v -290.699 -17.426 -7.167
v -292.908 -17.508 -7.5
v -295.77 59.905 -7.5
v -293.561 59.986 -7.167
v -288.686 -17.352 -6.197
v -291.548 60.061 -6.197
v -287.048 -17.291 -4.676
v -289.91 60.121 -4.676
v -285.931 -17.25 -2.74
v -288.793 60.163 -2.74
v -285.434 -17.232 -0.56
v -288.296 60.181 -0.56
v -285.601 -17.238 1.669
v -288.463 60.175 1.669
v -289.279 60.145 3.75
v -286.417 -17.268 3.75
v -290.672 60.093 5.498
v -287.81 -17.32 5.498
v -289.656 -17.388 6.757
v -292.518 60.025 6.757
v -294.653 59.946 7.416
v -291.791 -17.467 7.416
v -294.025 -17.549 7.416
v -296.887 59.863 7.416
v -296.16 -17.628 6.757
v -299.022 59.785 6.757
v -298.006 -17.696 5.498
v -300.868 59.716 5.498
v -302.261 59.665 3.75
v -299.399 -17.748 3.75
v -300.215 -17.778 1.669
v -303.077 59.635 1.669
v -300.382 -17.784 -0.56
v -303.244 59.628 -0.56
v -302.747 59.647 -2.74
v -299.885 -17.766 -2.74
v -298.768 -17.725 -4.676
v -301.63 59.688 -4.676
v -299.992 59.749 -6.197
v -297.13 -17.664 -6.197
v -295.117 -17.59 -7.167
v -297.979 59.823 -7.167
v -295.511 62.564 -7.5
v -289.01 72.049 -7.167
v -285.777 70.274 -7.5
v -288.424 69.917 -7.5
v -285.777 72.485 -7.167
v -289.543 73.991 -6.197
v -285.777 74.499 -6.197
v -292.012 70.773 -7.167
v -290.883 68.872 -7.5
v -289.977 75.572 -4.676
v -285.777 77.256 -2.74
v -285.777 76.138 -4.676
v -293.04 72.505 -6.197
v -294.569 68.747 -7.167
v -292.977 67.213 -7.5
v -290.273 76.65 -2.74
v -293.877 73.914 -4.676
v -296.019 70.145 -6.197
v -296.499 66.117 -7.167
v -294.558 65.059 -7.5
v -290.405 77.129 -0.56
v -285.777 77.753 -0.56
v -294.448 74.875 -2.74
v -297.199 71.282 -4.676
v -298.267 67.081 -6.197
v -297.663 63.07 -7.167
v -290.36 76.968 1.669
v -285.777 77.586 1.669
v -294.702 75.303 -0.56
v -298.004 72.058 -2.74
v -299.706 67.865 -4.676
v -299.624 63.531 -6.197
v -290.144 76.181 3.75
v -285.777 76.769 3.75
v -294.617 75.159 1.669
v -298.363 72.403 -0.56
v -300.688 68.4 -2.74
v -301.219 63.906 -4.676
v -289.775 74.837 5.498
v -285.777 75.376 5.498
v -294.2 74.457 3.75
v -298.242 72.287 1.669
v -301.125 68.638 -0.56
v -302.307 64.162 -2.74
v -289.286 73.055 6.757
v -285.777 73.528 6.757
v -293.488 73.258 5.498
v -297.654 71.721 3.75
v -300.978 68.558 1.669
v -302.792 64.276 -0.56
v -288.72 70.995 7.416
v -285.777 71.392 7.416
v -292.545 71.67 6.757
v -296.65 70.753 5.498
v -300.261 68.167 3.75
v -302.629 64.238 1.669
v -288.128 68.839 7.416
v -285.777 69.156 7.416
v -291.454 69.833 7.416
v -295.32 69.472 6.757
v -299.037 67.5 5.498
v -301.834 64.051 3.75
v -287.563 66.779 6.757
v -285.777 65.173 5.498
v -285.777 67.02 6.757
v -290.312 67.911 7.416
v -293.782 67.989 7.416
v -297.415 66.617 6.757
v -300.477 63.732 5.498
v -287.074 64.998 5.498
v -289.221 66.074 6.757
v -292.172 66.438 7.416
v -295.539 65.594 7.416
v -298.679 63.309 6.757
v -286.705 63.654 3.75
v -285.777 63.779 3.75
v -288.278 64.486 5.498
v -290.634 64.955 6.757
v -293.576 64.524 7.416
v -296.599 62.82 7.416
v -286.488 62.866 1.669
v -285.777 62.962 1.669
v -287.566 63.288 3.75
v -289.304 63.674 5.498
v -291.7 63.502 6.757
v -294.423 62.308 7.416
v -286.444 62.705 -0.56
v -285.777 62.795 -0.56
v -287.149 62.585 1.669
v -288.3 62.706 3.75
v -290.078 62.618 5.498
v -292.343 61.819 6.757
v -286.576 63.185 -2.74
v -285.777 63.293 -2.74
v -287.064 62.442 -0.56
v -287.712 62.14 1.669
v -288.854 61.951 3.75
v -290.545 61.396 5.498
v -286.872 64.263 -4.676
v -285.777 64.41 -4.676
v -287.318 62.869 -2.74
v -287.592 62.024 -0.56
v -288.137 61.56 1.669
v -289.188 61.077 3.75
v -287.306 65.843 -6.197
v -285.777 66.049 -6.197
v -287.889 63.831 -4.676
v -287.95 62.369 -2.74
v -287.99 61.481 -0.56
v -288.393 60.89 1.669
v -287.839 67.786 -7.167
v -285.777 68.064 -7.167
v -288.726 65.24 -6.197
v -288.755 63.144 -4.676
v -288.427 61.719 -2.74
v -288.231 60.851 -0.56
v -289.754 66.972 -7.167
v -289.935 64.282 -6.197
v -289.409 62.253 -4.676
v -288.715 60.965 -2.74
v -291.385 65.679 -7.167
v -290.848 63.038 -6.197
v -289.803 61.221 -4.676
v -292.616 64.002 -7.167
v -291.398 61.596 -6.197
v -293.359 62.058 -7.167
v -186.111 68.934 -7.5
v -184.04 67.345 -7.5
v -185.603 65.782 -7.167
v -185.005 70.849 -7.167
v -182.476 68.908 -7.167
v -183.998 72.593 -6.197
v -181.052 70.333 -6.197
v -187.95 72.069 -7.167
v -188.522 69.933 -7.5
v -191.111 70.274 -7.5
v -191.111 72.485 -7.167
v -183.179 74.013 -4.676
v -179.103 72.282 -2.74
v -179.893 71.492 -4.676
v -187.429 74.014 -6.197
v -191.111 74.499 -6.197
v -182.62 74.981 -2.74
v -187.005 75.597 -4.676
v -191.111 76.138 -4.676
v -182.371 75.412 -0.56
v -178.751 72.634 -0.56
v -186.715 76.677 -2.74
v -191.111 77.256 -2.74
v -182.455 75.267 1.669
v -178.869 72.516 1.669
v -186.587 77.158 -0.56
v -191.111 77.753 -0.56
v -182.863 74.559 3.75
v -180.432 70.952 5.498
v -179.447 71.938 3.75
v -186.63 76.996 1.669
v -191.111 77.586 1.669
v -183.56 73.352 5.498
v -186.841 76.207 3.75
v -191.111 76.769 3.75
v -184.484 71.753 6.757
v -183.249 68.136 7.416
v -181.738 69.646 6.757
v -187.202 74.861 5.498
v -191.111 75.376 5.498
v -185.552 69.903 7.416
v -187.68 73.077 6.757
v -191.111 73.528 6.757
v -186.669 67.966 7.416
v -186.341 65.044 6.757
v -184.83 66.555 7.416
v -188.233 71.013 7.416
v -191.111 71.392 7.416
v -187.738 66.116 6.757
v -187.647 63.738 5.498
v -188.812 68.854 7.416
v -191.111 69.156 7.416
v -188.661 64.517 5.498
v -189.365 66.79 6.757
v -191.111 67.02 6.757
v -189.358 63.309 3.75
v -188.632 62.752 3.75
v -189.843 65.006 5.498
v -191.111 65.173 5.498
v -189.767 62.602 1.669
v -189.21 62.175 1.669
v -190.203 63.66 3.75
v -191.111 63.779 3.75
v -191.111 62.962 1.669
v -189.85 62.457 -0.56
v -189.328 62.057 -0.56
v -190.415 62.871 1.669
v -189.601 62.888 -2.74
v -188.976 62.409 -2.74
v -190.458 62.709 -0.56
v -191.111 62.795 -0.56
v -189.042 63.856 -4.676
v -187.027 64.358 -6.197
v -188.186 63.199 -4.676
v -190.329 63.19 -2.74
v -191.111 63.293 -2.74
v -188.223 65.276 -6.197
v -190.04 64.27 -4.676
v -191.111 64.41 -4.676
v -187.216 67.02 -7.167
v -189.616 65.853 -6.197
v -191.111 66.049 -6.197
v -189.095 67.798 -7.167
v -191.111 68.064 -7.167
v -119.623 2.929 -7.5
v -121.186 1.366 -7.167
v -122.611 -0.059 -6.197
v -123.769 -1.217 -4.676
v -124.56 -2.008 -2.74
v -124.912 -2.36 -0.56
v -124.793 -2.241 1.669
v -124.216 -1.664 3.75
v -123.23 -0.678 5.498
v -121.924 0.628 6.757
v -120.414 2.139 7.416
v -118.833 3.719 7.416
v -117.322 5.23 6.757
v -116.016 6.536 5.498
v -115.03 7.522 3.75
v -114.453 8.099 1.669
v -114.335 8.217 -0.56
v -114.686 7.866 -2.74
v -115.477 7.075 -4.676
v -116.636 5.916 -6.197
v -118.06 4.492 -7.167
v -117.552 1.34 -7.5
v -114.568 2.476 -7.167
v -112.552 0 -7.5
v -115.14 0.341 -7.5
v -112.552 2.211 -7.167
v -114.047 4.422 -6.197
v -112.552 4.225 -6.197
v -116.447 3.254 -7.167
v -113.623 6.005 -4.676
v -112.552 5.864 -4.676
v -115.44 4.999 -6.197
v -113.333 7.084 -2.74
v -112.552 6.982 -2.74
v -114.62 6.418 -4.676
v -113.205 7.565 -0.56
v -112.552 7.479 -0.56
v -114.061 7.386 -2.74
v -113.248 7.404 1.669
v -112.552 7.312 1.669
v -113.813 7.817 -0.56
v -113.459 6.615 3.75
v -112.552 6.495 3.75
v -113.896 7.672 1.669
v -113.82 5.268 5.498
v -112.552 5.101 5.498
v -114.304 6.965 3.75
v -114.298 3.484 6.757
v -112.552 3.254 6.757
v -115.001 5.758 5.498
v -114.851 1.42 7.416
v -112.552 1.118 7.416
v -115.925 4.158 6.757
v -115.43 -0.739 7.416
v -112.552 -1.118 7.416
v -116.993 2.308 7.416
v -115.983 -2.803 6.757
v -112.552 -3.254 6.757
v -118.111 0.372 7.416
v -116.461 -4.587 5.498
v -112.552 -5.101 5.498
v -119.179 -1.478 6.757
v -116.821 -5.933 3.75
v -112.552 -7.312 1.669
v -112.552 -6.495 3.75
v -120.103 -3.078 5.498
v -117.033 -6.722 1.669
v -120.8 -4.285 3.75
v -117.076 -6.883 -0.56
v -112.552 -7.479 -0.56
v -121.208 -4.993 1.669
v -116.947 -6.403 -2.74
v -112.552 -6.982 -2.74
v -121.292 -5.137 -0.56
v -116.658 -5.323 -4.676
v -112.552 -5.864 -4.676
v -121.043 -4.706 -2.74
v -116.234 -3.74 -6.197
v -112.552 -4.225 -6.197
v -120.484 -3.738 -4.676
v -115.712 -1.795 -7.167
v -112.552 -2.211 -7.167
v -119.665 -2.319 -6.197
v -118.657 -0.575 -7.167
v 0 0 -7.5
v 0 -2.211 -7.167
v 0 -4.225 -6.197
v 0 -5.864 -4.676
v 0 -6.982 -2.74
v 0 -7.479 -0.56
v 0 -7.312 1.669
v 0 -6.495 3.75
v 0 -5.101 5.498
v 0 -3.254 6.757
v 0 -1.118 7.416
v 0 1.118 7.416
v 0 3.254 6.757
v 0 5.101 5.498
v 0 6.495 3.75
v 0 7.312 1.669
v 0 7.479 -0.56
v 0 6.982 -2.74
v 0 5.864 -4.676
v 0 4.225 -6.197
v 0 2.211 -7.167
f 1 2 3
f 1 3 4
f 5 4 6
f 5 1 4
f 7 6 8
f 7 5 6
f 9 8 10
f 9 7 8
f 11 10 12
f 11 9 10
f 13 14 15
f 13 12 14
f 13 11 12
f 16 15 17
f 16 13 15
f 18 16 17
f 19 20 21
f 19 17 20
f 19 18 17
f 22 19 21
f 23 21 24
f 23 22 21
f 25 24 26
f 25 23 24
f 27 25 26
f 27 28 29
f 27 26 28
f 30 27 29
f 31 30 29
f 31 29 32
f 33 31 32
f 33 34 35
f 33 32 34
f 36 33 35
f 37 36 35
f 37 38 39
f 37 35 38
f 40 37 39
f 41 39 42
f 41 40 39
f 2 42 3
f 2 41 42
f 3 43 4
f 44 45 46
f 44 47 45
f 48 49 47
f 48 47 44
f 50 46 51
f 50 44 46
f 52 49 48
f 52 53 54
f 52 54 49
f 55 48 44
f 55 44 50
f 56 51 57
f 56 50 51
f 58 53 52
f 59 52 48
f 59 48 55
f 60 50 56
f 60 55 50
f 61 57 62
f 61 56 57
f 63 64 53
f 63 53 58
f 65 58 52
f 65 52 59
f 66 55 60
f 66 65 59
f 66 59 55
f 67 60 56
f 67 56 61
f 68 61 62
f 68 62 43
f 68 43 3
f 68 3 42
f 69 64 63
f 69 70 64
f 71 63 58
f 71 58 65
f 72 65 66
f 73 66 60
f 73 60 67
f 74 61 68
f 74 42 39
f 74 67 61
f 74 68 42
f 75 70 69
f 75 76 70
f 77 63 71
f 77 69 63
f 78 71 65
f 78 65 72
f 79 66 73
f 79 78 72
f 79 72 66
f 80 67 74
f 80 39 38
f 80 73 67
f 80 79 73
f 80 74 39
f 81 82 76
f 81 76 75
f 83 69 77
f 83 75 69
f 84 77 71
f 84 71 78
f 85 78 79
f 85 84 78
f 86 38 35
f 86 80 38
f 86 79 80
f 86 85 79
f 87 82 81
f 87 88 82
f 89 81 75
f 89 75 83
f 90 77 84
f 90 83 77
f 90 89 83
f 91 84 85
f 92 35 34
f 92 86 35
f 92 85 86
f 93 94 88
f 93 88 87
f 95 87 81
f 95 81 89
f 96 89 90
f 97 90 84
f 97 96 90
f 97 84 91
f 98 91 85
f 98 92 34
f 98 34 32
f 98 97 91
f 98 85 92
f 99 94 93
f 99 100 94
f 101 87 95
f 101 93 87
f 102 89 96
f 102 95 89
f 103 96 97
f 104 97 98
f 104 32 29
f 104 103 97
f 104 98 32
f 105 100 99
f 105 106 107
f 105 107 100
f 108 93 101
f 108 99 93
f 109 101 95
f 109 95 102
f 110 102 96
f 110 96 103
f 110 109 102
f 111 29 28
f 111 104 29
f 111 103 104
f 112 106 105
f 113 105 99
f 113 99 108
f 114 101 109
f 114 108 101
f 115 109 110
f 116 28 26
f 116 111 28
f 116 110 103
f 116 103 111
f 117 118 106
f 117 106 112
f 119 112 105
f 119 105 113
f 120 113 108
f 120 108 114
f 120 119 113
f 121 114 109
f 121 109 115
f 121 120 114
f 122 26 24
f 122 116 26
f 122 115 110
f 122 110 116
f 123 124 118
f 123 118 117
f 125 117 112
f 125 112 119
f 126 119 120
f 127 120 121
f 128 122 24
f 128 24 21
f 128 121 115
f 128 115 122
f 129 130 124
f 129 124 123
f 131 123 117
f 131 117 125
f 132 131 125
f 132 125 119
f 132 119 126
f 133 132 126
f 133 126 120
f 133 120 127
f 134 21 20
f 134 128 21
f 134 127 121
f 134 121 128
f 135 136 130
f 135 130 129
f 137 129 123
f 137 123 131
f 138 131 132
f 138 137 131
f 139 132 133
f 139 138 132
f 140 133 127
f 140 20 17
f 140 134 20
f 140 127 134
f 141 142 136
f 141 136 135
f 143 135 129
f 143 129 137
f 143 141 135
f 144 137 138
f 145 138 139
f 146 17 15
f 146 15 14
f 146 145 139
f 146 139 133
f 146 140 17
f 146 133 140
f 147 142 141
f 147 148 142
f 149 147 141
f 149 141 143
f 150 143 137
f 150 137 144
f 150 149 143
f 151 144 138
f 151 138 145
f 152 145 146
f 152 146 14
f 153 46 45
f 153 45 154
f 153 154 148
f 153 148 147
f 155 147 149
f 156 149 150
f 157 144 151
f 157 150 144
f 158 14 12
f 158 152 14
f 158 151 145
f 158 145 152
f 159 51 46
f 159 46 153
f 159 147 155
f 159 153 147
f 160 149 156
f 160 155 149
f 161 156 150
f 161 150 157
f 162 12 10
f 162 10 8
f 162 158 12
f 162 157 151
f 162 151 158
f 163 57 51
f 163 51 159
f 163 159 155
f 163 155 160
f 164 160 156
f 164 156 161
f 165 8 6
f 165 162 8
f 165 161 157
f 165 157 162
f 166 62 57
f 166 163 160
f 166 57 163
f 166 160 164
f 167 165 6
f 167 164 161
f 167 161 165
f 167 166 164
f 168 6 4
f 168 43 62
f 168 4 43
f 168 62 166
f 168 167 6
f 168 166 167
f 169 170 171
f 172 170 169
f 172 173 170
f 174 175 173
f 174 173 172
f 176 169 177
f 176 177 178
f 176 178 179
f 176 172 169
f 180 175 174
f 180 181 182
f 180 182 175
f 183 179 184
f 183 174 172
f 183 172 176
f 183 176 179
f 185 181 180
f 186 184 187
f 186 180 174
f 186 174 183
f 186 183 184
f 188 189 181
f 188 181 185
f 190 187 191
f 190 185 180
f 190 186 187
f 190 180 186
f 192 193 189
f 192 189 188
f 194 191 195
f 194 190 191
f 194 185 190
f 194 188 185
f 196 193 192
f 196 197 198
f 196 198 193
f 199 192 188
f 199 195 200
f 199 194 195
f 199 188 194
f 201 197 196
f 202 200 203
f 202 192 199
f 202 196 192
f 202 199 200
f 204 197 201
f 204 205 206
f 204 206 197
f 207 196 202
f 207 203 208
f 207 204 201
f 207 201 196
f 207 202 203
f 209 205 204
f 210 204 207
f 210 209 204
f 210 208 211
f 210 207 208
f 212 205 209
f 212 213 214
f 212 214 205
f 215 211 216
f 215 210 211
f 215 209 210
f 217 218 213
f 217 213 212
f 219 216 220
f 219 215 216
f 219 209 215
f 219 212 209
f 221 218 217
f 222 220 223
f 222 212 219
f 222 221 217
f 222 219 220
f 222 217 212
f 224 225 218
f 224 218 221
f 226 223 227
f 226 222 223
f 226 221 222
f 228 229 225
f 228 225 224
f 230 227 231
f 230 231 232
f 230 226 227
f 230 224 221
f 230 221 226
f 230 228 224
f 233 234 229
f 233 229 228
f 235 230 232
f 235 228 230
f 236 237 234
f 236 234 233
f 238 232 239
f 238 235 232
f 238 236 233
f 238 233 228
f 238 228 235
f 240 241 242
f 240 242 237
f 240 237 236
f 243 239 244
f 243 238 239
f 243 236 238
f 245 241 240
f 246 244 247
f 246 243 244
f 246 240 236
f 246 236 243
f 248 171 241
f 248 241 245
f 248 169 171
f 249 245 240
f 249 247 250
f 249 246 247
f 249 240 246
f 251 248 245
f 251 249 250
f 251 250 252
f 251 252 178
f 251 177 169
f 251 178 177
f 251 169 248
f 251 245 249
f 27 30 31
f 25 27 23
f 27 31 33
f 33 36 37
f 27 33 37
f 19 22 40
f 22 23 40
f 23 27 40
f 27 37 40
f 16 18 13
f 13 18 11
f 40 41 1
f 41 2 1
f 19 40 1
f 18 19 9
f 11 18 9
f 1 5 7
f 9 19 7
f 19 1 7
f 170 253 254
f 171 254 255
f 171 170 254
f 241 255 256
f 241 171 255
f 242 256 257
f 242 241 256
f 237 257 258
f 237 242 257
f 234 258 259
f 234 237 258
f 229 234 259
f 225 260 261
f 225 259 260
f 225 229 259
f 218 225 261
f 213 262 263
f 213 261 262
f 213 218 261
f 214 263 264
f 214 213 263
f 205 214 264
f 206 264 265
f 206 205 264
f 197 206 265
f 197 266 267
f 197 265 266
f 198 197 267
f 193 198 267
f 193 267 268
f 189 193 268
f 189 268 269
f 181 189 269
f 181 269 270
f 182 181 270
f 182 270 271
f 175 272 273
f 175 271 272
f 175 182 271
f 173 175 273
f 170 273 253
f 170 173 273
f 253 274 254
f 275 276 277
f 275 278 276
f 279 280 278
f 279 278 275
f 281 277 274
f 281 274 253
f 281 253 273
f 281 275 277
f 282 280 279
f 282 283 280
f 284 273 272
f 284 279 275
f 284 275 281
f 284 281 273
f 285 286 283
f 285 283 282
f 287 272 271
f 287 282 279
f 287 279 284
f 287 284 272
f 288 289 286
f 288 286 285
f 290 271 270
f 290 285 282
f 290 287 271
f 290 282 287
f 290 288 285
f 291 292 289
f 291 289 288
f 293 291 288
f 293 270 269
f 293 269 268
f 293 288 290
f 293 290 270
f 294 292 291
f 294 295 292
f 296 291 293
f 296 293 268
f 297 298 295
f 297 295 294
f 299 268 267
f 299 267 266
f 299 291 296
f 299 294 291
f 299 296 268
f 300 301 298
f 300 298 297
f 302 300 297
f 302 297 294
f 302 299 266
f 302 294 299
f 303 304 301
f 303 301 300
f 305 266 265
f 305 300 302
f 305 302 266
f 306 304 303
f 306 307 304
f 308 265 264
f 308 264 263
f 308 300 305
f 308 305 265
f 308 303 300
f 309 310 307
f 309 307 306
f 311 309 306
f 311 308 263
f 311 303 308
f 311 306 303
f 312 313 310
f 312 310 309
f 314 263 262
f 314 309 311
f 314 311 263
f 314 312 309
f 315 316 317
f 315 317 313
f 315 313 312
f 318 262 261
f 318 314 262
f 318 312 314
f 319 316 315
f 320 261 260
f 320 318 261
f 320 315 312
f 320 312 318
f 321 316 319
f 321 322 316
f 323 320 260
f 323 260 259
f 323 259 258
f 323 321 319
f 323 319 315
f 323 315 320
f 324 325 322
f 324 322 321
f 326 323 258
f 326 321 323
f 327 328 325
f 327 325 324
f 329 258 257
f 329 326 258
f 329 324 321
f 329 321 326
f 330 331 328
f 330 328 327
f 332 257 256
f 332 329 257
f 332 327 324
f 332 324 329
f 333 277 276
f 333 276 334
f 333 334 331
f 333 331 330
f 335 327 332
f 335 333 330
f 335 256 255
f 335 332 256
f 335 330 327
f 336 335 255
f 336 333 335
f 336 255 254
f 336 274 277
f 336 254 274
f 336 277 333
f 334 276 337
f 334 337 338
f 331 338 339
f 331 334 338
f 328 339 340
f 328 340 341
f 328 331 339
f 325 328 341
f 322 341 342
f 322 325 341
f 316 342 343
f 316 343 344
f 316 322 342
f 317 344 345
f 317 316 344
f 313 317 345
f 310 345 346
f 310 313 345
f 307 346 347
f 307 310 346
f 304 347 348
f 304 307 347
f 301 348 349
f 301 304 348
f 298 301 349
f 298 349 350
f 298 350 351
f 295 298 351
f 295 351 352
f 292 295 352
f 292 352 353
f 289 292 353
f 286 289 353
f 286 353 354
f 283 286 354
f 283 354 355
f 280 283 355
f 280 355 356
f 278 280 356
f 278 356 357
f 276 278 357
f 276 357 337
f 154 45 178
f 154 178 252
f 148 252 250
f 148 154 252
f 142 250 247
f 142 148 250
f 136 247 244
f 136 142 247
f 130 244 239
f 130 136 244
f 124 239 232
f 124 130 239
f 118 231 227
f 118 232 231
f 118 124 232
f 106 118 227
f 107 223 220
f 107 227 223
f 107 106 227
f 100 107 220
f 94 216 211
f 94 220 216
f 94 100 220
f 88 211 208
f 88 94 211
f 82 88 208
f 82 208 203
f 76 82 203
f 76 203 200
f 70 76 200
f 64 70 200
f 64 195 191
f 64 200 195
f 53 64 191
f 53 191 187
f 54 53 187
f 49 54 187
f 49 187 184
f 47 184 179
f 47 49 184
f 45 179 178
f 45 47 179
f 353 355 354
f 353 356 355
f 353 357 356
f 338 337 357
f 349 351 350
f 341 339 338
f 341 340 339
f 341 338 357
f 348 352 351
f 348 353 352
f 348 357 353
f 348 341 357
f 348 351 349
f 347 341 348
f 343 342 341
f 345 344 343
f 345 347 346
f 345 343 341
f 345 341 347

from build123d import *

# Parameters (mm, degrees)
SKETCH1_R = 7.5


with BuildPart() as part:
    # Sweep3: sweep along a curve in space
    with BuildLine() as sweep3_path:
        Line((0, 0, 0), (-112.552079249, 0, 0))
        ThreePointArc((-112.552079249, 0, 0), (-116.378913573, 0.761204675, 0), (-119.623147061, 2.928932188, 0))
        Line((-119.623147061, 2.928932188, 0), (-184.039505872, 67.345290999, 0))
        ThreePointArc((-184.039505872, 67.345290999, 0), (-187.28373936, 69.513018512, 0), (-191.110573684, 70.274223187, 0))
        Line((-191.110573684, 70.274223187, 0), (-285.776779589, 70.274223187, 0))
        ThreePointArc((-285.776779589, 70.274223187, 0), (-292.977279683, 67.213444929, 0), (-295.769952951, 59.904782865, 0))
        Line((-295.769952951, 59.904782865, 0), (-292.90806011, -17.507967024, 0))
    # Sketch1 → Sweep3 (sweep)
    with BuildSketch(Plane(origin=(0, 0, 0), x_dir=(0, 0, -1), z_dir=(1, 0, 0))):
        Circle(SKETCH1_R)
    sweep(path=sweep3_path.line)


solid = part.part
